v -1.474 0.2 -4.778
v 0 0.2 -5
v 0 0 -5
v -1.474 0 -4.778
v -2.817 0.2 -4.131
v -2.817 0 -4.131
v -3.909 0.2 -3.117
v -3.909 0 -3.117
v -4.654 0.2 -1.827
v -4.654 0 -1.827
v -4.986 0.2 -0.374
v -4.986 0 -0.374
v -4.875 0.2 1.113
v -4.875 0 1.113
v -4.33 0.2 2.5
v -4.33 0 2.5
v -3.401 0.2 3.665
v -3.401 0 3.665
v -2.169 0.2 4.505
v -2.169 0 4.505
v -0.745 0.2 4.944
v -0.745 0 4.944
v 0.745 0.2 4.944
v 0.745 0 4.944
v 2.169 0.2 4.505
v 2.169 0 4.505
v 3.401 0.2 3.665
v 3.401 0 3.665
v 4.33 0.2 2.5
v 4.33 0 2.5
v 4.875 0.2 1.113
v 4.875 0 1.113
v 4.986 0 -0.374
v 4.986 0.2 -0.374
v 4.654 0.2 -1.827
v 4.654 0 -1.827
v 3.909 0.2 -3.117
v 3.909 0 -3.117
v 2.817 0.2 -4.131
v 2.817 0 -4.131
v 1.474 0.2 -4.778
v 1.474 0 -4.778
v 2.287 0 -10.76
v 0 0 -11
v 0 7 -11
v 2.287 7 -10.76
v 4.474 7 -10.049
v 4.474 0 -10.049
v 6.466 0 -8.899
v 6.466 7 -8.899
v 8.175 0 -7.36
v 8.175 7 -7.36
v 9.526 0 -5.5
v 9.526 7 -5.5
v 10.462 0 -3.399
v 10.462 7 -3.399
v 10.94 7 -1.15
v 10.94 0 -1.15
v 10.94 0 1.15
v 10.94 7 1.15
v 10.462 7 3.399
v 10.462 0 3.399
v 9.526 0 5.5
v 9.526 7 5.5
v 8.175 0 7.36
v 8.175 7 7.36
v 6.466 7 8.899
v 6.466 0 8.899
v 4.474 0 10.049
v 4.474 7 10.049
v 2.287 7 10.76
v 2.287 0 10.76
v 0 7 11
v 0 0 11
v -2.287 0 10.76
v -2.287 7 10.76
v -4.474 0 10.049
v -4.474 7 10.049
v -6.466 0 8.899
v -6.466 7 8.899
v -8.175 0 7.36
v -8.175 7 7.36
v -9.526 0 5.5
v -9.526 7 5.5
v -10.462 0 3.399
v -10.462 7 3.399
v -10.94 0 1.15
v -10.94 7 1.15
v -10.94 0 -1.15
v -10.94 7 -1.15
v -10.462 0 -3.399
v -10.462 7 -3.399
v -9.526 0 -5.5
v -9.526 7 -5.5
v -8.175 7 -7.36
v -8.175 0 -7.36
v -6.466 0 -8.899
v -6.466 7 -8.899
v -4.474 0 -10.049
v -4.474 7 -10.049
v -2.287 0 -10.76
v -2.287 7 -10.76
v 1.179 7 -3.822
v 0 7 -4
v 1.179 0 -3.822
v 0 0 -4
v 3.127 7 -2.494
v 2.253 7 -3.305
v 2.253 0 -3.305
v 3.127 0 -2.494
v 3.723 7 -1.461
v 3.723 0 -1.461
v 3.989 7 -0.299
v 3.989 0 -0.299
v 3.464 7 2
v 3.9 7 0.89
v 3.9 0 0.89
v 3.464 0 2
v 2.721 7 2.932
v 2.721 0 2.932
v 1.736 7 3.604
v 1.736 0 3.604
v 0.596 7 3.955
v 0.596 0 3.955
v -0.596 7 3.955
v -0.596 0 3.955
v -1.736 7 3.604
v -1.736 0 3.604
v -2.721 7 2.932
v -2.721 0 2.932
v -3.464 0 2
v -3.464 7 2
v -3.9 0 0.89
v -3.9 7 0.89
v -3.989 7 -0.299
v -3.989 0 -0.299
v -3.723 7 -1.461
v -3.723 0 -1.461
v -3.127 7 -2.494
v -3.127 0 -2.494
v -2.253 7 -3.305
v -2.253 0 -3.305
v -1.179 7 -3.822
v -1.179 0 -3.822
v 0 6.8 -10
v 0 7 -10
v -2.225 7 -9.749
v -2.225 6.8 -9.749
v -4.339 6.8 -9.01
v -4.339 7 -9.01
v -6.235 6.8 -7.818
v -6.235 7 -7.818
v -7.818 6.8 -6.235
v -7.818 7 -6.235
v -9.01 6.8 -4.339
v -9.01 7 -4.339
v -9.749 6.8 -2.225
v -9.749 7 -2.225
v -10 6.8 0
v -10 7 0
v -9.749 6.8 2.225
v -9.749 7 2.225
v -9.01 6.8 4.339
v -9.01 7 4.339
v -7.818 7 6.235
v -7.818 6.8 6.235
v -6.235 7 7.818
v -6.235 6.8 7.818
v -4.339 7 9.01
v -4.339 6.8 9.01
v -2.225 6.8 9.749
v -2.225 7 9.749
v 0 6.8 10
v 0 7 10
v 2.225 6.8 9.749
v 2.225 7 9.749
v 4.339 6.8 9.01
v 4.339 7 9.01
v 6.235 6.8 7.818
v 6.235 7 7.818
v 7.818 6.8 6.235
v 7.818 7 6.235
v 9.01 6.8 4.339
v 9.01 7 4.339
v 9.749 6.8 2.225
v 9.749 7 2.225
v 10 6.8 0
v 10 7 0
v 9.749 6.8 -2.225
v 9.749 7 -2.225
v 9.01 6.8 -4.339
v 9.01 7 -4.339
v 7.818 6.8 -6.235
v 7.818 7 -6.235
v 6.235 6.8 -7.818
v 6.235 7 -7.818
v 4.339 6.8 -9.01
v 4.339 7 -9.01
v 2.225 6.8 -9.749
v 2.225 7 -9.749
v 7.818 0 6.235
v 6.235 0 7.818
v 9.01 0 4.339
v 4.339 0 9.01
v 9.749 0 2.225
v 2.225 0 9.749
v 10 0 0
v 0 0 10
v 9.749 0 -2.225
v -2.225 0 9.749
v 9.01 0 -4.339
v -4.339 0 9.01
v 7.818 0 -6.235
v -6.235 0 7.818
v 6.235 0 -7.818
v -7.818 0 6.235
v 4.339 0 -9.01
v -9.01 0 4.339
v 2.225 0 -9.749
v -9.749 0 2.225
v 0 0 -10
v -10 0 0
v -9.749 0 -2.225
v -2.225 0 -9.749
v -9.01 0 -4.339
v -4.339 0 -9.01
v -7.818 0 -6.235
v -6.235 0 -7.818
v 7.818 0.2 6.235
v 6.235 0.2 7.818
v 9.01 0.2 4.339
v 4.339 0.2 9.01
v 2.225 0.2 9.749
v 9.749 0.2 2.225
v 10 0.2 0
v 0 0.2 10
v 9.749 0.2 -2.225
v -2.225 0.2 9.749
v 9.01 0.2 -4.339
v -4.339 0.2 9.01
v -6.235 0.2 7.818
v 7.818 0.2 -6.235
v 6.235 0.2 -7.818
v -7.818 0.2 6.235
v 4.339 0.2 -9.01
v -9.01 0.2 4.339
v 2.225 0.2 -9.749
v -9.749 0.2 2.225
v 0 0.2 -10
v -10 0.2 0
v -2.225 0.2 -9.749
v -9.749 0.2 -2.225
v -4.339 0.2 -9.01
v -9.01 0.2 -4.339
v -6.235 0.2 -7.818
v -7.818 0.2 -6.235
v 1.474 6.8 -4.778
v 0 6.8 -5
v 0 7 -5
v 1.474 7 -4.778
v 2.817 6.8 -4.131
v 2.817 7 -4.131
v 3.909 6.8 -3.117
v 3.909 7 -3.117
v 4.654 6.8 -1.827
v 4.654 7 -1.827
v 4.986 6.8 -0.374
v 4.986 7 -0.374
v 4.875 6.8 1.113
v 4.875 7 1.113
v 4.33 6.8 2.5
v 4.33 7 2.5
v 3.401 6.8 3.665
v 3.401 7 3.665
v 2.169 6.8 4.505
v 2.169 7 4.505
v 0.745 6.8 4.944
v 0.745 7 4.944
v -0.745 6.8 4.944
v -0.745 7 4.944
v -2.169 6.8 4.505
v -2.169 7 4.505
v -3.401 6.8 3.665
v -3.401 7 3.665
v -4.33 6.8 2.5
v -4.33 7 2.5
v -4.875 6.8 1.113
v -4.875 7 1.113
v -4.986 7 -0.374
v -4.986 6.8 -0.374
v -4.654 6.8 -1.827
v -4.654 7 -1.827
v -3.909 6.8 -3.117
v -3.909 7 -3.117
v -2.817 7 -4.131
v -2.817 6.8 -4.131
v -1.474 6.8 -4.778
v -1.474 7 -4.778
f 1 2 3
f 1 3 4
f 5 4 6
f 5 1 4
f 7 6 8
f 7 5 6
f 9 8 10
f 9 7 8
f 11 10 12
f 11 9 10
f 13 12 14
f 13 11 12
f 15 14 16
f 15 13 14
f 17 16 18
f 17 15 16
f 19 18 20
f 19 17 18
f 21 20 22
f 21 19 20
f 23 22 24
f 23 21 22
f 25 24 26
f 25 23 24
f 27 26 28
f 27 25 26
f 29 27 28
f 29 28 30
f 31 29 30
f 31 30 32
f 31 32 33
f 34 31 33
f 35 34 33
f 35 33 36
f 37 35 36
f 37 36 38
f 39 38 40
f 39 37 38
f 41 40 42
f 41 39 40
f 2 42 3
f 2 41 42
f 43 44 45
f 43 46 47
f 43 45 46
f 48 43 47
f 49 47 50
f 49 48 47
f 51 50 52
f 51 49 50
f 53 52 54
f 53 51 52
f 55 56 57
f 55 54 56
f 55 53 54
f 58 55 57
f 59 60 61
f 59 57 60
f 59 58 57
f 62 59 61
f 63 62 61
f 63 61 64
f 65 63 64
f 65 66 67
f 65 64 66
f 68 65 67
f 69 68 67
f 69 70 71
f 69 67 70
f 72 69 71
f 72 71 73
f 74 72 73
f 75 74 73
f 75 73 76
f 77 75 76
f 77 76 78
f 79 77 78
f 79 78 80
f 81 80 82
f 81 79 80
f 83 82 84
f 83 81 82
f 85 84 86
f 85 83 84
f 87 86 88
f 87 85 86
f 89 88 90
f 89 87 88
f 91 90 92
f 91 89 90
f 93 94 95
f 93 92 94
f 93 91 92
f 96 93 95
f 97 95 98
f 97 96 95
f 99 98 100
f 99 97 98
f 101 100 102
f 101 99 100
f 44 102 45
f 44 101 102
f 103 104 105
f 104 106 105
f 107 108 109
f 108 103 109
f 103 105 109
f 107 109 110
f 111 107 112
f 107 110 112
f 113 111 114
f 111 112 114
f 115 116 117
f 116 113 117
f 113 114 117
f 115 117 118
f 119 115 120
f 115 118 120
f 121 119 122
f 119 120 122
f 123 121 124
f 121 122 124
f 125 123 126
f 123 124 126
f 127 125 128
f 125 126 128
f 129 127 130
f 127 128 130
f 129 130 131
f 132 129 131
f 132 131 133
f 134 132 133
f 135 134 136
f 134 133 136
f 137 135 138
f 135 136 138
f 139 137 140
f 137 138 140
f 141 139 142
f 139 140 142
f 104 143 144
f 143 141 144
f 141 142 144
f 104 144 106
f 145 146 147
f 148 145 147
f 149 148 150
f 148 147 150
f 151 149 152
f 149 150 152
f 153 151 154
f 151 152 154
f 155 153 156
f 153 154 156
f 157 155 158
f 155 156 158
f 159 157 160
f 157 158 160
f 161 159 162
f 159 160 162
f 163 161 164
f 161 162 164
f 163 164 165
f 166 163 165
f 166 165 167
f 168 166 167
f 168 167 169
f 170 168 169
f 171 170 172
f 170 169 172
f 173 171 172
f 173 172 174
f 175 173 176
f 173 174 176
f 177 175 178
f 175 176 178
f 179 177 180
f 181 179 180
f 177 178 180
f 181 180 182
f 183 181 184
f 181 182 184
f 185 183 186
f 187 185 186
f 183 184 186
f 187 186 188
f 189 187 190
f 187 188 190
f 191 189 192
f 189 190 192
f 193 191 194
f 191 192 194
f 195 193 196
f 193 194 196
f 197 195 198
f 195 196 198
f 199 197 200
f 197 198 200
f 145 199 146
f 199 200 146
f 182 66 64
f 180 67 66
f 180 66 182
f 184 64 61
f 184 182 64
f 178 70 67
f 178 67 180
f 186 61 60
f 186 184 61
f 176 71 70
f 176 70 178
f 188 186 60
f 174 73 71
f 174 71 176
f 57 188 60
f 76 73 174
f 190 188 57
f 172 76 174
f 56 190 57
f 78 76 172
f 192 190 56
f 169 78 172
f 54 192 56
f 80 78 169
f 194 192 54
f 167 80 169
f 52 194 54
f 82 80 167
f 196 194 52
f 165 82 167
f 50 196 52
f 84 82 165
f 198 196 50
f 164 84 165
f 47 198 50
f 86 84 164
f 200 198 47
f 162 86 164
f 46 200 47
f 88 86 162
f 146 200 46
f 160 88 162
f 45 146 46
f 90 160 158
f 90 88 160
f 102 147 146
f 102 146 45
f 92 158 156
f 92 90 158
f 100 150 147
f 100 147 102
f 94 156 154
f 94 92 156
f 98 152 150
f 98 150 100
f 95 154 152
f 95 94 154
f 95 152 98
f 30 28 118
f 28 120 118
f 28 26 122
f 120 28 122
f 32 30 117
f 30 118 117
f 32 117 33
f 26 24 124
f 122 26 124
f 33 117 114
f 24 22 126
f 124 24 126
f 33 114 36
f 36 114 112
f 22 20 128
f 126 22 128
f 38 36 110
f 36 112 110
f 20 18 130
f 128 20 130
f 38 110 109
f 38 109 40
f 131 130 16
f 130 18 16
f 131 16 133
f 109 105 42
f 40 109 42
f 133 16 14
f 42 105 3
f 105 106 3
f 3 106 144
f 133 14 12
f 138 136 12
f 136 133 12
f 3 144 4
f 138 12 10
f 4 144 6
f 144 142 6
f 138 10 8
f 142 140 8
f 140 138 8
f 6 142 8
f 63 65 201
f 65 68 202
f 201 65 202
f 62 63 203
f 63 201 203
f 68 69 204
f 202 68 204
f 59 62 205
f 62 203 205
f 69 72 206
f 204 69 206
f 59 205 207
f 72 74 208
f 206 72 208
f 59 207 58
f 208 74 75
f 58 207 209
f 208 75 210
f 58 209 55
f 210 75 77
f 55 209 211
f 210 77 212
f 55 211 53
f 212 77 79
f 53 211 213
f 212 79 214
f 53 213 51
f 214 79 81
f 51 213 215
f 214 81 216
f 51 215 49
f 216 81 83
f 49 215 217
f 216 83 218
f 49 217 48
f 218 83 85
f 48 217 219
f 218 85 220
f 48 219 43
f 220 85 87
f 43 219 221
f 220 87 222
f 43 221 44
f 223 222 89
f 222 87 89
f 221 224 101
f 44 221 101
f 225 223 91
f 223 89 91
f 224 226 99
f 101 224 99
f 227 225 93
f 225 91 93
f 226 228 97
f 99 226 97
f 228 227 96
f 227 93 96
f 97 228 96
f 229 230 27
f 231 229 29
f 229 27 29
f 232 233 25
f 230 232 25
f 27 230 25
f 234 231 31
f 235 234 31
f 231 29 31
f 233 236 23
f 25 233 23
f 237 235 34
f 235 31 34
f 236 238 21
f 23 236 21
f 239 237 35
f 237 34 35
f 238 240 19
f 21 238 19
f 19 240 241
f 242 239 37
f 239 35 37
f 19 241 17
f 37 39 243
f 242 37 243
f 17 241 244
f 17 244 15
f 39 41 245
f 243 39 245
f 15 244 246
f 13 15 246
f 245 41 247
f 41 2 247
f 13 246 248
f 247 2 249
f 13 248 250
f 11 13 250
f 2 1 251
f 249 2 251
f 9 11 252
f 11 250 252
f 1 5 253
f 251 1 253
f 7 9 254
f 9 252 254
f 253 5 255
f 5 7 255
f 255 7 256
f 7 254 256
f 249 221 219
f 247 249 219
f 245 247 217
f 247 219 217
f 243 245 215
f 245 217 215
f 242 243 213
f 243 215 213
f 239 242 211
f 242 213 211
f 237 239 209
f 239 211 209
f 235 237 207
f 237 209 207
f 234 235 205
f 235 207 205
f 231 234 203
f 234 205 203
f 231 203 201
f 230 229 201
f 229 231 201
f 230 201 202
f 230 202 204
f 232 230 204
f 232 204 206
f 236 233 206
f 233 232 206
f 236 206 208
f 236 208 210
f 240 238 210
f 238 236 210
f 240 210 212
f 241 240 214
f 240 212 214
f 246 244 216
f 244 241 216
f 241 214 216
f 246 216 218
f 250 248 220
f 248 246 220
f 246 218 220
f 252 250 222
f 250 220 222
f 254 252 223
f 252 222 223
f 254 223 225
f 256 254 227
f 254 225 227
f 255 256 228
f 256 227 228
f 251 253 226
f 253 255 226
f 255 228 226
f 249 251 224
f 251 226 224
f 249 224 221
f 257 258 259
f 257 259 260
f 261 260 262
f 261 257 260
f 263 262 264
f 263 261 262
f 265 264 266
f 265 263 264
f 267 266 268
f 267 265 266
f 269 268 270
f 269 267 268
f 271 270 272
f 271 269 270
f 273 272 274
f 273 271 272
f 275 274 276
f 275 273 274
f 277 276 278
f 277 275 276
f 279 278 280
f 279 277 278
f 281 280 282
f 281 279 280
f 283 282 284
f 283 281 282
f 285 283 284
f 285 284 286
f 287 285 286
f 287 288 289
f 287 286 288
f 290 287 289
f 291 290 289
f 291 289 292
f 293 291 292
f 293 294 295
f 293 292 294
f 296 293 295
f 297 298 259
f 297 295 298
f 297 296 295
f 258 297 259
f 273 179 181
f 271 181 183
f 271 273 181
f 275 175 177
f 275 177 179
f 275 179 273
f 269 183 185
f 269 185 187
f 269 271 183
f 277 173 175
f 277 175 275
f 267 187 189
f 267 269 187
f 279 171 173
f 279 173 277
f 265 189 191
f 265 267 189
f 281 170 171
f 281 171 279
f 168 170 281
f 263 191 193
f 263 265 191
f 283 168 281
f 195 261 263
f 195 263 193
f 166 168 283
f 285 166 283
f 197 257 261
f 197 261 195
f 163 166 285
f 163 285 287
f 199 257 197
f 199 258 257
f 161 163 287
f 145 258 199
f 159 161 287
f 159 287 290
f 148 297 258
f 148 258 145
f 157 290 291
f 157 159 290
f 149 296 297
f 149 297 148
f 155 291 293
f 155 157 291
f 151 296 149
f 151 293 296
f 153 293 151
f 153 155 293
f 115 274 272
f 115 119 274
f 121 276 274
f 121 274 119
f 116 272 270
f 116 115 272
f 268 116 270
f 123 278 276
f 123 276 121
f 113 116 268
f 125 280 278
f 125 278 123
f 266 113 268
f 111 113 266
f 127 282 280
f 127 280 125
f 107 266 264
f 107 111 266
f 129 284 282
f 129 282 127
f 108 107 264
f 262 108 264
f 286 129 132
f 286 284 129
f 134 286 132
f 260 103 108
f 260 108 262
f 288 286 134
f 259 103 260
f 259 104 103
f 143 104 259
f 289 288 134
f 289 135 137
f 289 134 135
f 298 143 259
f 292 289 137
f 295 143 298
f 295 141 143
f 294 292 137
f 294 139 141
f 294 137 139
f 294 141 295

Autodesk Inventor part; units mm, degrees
ref_plane "YZ Plane" through (0, 0, 0) normal (1, 0, 0) x (0, 1, 0)
ref_plane "XZ Plane" through (0, 0, 0) normal (0, 1, 0) x (-1, 0, 0)
ref_plane "XY Plane" through (0, 0, 0) normal (0, 0, 1) x (1, 0, 0)
sketch "Sketch1" plane through (0, 0, 0) normal (1, 0, 0) x (0, 1, 0)
  line L0 (0, 0) -> (7, 0) construction
  line L1 (7, 0) -> (7, -4) construction
  line L2 (7, -4) -> (0, -4)
  line L3 (0, -4) -> (0, 0) construction
  line L4 (7, -11) -> (0, -11)
  line L5 (7, -5) -> (6.8, -5)
  line L6 (6.8, -5) -> (6.8, -10)
  line L7 (6.8, -10) -> (7, -10)
  line L8 (0, -5) -> (0.2, -5)
  line L9 (0.2, -5) -> (0.2, -10)
  line L10 (0.2, -10) -> (0, -10)
  line L11 (7, -4) -> (7, -5)
  line L12 (7, -10) -> (7, -11)
  line L13 (0, -11) -> (0, -10)
  line L14 (0, -5) -> (0, -4)
  dimension "d0" = 4
  dimension "d2" = 7
  dimension "d5" = 11
  dimension "d6" = 0.2
  dimension "d7" = 1
revolve "Revolution1" add sketch "Sketch1" angle 360 about axis through (0, 0, 0) along (0, 1, 0)
properties part number "608 bearing"
